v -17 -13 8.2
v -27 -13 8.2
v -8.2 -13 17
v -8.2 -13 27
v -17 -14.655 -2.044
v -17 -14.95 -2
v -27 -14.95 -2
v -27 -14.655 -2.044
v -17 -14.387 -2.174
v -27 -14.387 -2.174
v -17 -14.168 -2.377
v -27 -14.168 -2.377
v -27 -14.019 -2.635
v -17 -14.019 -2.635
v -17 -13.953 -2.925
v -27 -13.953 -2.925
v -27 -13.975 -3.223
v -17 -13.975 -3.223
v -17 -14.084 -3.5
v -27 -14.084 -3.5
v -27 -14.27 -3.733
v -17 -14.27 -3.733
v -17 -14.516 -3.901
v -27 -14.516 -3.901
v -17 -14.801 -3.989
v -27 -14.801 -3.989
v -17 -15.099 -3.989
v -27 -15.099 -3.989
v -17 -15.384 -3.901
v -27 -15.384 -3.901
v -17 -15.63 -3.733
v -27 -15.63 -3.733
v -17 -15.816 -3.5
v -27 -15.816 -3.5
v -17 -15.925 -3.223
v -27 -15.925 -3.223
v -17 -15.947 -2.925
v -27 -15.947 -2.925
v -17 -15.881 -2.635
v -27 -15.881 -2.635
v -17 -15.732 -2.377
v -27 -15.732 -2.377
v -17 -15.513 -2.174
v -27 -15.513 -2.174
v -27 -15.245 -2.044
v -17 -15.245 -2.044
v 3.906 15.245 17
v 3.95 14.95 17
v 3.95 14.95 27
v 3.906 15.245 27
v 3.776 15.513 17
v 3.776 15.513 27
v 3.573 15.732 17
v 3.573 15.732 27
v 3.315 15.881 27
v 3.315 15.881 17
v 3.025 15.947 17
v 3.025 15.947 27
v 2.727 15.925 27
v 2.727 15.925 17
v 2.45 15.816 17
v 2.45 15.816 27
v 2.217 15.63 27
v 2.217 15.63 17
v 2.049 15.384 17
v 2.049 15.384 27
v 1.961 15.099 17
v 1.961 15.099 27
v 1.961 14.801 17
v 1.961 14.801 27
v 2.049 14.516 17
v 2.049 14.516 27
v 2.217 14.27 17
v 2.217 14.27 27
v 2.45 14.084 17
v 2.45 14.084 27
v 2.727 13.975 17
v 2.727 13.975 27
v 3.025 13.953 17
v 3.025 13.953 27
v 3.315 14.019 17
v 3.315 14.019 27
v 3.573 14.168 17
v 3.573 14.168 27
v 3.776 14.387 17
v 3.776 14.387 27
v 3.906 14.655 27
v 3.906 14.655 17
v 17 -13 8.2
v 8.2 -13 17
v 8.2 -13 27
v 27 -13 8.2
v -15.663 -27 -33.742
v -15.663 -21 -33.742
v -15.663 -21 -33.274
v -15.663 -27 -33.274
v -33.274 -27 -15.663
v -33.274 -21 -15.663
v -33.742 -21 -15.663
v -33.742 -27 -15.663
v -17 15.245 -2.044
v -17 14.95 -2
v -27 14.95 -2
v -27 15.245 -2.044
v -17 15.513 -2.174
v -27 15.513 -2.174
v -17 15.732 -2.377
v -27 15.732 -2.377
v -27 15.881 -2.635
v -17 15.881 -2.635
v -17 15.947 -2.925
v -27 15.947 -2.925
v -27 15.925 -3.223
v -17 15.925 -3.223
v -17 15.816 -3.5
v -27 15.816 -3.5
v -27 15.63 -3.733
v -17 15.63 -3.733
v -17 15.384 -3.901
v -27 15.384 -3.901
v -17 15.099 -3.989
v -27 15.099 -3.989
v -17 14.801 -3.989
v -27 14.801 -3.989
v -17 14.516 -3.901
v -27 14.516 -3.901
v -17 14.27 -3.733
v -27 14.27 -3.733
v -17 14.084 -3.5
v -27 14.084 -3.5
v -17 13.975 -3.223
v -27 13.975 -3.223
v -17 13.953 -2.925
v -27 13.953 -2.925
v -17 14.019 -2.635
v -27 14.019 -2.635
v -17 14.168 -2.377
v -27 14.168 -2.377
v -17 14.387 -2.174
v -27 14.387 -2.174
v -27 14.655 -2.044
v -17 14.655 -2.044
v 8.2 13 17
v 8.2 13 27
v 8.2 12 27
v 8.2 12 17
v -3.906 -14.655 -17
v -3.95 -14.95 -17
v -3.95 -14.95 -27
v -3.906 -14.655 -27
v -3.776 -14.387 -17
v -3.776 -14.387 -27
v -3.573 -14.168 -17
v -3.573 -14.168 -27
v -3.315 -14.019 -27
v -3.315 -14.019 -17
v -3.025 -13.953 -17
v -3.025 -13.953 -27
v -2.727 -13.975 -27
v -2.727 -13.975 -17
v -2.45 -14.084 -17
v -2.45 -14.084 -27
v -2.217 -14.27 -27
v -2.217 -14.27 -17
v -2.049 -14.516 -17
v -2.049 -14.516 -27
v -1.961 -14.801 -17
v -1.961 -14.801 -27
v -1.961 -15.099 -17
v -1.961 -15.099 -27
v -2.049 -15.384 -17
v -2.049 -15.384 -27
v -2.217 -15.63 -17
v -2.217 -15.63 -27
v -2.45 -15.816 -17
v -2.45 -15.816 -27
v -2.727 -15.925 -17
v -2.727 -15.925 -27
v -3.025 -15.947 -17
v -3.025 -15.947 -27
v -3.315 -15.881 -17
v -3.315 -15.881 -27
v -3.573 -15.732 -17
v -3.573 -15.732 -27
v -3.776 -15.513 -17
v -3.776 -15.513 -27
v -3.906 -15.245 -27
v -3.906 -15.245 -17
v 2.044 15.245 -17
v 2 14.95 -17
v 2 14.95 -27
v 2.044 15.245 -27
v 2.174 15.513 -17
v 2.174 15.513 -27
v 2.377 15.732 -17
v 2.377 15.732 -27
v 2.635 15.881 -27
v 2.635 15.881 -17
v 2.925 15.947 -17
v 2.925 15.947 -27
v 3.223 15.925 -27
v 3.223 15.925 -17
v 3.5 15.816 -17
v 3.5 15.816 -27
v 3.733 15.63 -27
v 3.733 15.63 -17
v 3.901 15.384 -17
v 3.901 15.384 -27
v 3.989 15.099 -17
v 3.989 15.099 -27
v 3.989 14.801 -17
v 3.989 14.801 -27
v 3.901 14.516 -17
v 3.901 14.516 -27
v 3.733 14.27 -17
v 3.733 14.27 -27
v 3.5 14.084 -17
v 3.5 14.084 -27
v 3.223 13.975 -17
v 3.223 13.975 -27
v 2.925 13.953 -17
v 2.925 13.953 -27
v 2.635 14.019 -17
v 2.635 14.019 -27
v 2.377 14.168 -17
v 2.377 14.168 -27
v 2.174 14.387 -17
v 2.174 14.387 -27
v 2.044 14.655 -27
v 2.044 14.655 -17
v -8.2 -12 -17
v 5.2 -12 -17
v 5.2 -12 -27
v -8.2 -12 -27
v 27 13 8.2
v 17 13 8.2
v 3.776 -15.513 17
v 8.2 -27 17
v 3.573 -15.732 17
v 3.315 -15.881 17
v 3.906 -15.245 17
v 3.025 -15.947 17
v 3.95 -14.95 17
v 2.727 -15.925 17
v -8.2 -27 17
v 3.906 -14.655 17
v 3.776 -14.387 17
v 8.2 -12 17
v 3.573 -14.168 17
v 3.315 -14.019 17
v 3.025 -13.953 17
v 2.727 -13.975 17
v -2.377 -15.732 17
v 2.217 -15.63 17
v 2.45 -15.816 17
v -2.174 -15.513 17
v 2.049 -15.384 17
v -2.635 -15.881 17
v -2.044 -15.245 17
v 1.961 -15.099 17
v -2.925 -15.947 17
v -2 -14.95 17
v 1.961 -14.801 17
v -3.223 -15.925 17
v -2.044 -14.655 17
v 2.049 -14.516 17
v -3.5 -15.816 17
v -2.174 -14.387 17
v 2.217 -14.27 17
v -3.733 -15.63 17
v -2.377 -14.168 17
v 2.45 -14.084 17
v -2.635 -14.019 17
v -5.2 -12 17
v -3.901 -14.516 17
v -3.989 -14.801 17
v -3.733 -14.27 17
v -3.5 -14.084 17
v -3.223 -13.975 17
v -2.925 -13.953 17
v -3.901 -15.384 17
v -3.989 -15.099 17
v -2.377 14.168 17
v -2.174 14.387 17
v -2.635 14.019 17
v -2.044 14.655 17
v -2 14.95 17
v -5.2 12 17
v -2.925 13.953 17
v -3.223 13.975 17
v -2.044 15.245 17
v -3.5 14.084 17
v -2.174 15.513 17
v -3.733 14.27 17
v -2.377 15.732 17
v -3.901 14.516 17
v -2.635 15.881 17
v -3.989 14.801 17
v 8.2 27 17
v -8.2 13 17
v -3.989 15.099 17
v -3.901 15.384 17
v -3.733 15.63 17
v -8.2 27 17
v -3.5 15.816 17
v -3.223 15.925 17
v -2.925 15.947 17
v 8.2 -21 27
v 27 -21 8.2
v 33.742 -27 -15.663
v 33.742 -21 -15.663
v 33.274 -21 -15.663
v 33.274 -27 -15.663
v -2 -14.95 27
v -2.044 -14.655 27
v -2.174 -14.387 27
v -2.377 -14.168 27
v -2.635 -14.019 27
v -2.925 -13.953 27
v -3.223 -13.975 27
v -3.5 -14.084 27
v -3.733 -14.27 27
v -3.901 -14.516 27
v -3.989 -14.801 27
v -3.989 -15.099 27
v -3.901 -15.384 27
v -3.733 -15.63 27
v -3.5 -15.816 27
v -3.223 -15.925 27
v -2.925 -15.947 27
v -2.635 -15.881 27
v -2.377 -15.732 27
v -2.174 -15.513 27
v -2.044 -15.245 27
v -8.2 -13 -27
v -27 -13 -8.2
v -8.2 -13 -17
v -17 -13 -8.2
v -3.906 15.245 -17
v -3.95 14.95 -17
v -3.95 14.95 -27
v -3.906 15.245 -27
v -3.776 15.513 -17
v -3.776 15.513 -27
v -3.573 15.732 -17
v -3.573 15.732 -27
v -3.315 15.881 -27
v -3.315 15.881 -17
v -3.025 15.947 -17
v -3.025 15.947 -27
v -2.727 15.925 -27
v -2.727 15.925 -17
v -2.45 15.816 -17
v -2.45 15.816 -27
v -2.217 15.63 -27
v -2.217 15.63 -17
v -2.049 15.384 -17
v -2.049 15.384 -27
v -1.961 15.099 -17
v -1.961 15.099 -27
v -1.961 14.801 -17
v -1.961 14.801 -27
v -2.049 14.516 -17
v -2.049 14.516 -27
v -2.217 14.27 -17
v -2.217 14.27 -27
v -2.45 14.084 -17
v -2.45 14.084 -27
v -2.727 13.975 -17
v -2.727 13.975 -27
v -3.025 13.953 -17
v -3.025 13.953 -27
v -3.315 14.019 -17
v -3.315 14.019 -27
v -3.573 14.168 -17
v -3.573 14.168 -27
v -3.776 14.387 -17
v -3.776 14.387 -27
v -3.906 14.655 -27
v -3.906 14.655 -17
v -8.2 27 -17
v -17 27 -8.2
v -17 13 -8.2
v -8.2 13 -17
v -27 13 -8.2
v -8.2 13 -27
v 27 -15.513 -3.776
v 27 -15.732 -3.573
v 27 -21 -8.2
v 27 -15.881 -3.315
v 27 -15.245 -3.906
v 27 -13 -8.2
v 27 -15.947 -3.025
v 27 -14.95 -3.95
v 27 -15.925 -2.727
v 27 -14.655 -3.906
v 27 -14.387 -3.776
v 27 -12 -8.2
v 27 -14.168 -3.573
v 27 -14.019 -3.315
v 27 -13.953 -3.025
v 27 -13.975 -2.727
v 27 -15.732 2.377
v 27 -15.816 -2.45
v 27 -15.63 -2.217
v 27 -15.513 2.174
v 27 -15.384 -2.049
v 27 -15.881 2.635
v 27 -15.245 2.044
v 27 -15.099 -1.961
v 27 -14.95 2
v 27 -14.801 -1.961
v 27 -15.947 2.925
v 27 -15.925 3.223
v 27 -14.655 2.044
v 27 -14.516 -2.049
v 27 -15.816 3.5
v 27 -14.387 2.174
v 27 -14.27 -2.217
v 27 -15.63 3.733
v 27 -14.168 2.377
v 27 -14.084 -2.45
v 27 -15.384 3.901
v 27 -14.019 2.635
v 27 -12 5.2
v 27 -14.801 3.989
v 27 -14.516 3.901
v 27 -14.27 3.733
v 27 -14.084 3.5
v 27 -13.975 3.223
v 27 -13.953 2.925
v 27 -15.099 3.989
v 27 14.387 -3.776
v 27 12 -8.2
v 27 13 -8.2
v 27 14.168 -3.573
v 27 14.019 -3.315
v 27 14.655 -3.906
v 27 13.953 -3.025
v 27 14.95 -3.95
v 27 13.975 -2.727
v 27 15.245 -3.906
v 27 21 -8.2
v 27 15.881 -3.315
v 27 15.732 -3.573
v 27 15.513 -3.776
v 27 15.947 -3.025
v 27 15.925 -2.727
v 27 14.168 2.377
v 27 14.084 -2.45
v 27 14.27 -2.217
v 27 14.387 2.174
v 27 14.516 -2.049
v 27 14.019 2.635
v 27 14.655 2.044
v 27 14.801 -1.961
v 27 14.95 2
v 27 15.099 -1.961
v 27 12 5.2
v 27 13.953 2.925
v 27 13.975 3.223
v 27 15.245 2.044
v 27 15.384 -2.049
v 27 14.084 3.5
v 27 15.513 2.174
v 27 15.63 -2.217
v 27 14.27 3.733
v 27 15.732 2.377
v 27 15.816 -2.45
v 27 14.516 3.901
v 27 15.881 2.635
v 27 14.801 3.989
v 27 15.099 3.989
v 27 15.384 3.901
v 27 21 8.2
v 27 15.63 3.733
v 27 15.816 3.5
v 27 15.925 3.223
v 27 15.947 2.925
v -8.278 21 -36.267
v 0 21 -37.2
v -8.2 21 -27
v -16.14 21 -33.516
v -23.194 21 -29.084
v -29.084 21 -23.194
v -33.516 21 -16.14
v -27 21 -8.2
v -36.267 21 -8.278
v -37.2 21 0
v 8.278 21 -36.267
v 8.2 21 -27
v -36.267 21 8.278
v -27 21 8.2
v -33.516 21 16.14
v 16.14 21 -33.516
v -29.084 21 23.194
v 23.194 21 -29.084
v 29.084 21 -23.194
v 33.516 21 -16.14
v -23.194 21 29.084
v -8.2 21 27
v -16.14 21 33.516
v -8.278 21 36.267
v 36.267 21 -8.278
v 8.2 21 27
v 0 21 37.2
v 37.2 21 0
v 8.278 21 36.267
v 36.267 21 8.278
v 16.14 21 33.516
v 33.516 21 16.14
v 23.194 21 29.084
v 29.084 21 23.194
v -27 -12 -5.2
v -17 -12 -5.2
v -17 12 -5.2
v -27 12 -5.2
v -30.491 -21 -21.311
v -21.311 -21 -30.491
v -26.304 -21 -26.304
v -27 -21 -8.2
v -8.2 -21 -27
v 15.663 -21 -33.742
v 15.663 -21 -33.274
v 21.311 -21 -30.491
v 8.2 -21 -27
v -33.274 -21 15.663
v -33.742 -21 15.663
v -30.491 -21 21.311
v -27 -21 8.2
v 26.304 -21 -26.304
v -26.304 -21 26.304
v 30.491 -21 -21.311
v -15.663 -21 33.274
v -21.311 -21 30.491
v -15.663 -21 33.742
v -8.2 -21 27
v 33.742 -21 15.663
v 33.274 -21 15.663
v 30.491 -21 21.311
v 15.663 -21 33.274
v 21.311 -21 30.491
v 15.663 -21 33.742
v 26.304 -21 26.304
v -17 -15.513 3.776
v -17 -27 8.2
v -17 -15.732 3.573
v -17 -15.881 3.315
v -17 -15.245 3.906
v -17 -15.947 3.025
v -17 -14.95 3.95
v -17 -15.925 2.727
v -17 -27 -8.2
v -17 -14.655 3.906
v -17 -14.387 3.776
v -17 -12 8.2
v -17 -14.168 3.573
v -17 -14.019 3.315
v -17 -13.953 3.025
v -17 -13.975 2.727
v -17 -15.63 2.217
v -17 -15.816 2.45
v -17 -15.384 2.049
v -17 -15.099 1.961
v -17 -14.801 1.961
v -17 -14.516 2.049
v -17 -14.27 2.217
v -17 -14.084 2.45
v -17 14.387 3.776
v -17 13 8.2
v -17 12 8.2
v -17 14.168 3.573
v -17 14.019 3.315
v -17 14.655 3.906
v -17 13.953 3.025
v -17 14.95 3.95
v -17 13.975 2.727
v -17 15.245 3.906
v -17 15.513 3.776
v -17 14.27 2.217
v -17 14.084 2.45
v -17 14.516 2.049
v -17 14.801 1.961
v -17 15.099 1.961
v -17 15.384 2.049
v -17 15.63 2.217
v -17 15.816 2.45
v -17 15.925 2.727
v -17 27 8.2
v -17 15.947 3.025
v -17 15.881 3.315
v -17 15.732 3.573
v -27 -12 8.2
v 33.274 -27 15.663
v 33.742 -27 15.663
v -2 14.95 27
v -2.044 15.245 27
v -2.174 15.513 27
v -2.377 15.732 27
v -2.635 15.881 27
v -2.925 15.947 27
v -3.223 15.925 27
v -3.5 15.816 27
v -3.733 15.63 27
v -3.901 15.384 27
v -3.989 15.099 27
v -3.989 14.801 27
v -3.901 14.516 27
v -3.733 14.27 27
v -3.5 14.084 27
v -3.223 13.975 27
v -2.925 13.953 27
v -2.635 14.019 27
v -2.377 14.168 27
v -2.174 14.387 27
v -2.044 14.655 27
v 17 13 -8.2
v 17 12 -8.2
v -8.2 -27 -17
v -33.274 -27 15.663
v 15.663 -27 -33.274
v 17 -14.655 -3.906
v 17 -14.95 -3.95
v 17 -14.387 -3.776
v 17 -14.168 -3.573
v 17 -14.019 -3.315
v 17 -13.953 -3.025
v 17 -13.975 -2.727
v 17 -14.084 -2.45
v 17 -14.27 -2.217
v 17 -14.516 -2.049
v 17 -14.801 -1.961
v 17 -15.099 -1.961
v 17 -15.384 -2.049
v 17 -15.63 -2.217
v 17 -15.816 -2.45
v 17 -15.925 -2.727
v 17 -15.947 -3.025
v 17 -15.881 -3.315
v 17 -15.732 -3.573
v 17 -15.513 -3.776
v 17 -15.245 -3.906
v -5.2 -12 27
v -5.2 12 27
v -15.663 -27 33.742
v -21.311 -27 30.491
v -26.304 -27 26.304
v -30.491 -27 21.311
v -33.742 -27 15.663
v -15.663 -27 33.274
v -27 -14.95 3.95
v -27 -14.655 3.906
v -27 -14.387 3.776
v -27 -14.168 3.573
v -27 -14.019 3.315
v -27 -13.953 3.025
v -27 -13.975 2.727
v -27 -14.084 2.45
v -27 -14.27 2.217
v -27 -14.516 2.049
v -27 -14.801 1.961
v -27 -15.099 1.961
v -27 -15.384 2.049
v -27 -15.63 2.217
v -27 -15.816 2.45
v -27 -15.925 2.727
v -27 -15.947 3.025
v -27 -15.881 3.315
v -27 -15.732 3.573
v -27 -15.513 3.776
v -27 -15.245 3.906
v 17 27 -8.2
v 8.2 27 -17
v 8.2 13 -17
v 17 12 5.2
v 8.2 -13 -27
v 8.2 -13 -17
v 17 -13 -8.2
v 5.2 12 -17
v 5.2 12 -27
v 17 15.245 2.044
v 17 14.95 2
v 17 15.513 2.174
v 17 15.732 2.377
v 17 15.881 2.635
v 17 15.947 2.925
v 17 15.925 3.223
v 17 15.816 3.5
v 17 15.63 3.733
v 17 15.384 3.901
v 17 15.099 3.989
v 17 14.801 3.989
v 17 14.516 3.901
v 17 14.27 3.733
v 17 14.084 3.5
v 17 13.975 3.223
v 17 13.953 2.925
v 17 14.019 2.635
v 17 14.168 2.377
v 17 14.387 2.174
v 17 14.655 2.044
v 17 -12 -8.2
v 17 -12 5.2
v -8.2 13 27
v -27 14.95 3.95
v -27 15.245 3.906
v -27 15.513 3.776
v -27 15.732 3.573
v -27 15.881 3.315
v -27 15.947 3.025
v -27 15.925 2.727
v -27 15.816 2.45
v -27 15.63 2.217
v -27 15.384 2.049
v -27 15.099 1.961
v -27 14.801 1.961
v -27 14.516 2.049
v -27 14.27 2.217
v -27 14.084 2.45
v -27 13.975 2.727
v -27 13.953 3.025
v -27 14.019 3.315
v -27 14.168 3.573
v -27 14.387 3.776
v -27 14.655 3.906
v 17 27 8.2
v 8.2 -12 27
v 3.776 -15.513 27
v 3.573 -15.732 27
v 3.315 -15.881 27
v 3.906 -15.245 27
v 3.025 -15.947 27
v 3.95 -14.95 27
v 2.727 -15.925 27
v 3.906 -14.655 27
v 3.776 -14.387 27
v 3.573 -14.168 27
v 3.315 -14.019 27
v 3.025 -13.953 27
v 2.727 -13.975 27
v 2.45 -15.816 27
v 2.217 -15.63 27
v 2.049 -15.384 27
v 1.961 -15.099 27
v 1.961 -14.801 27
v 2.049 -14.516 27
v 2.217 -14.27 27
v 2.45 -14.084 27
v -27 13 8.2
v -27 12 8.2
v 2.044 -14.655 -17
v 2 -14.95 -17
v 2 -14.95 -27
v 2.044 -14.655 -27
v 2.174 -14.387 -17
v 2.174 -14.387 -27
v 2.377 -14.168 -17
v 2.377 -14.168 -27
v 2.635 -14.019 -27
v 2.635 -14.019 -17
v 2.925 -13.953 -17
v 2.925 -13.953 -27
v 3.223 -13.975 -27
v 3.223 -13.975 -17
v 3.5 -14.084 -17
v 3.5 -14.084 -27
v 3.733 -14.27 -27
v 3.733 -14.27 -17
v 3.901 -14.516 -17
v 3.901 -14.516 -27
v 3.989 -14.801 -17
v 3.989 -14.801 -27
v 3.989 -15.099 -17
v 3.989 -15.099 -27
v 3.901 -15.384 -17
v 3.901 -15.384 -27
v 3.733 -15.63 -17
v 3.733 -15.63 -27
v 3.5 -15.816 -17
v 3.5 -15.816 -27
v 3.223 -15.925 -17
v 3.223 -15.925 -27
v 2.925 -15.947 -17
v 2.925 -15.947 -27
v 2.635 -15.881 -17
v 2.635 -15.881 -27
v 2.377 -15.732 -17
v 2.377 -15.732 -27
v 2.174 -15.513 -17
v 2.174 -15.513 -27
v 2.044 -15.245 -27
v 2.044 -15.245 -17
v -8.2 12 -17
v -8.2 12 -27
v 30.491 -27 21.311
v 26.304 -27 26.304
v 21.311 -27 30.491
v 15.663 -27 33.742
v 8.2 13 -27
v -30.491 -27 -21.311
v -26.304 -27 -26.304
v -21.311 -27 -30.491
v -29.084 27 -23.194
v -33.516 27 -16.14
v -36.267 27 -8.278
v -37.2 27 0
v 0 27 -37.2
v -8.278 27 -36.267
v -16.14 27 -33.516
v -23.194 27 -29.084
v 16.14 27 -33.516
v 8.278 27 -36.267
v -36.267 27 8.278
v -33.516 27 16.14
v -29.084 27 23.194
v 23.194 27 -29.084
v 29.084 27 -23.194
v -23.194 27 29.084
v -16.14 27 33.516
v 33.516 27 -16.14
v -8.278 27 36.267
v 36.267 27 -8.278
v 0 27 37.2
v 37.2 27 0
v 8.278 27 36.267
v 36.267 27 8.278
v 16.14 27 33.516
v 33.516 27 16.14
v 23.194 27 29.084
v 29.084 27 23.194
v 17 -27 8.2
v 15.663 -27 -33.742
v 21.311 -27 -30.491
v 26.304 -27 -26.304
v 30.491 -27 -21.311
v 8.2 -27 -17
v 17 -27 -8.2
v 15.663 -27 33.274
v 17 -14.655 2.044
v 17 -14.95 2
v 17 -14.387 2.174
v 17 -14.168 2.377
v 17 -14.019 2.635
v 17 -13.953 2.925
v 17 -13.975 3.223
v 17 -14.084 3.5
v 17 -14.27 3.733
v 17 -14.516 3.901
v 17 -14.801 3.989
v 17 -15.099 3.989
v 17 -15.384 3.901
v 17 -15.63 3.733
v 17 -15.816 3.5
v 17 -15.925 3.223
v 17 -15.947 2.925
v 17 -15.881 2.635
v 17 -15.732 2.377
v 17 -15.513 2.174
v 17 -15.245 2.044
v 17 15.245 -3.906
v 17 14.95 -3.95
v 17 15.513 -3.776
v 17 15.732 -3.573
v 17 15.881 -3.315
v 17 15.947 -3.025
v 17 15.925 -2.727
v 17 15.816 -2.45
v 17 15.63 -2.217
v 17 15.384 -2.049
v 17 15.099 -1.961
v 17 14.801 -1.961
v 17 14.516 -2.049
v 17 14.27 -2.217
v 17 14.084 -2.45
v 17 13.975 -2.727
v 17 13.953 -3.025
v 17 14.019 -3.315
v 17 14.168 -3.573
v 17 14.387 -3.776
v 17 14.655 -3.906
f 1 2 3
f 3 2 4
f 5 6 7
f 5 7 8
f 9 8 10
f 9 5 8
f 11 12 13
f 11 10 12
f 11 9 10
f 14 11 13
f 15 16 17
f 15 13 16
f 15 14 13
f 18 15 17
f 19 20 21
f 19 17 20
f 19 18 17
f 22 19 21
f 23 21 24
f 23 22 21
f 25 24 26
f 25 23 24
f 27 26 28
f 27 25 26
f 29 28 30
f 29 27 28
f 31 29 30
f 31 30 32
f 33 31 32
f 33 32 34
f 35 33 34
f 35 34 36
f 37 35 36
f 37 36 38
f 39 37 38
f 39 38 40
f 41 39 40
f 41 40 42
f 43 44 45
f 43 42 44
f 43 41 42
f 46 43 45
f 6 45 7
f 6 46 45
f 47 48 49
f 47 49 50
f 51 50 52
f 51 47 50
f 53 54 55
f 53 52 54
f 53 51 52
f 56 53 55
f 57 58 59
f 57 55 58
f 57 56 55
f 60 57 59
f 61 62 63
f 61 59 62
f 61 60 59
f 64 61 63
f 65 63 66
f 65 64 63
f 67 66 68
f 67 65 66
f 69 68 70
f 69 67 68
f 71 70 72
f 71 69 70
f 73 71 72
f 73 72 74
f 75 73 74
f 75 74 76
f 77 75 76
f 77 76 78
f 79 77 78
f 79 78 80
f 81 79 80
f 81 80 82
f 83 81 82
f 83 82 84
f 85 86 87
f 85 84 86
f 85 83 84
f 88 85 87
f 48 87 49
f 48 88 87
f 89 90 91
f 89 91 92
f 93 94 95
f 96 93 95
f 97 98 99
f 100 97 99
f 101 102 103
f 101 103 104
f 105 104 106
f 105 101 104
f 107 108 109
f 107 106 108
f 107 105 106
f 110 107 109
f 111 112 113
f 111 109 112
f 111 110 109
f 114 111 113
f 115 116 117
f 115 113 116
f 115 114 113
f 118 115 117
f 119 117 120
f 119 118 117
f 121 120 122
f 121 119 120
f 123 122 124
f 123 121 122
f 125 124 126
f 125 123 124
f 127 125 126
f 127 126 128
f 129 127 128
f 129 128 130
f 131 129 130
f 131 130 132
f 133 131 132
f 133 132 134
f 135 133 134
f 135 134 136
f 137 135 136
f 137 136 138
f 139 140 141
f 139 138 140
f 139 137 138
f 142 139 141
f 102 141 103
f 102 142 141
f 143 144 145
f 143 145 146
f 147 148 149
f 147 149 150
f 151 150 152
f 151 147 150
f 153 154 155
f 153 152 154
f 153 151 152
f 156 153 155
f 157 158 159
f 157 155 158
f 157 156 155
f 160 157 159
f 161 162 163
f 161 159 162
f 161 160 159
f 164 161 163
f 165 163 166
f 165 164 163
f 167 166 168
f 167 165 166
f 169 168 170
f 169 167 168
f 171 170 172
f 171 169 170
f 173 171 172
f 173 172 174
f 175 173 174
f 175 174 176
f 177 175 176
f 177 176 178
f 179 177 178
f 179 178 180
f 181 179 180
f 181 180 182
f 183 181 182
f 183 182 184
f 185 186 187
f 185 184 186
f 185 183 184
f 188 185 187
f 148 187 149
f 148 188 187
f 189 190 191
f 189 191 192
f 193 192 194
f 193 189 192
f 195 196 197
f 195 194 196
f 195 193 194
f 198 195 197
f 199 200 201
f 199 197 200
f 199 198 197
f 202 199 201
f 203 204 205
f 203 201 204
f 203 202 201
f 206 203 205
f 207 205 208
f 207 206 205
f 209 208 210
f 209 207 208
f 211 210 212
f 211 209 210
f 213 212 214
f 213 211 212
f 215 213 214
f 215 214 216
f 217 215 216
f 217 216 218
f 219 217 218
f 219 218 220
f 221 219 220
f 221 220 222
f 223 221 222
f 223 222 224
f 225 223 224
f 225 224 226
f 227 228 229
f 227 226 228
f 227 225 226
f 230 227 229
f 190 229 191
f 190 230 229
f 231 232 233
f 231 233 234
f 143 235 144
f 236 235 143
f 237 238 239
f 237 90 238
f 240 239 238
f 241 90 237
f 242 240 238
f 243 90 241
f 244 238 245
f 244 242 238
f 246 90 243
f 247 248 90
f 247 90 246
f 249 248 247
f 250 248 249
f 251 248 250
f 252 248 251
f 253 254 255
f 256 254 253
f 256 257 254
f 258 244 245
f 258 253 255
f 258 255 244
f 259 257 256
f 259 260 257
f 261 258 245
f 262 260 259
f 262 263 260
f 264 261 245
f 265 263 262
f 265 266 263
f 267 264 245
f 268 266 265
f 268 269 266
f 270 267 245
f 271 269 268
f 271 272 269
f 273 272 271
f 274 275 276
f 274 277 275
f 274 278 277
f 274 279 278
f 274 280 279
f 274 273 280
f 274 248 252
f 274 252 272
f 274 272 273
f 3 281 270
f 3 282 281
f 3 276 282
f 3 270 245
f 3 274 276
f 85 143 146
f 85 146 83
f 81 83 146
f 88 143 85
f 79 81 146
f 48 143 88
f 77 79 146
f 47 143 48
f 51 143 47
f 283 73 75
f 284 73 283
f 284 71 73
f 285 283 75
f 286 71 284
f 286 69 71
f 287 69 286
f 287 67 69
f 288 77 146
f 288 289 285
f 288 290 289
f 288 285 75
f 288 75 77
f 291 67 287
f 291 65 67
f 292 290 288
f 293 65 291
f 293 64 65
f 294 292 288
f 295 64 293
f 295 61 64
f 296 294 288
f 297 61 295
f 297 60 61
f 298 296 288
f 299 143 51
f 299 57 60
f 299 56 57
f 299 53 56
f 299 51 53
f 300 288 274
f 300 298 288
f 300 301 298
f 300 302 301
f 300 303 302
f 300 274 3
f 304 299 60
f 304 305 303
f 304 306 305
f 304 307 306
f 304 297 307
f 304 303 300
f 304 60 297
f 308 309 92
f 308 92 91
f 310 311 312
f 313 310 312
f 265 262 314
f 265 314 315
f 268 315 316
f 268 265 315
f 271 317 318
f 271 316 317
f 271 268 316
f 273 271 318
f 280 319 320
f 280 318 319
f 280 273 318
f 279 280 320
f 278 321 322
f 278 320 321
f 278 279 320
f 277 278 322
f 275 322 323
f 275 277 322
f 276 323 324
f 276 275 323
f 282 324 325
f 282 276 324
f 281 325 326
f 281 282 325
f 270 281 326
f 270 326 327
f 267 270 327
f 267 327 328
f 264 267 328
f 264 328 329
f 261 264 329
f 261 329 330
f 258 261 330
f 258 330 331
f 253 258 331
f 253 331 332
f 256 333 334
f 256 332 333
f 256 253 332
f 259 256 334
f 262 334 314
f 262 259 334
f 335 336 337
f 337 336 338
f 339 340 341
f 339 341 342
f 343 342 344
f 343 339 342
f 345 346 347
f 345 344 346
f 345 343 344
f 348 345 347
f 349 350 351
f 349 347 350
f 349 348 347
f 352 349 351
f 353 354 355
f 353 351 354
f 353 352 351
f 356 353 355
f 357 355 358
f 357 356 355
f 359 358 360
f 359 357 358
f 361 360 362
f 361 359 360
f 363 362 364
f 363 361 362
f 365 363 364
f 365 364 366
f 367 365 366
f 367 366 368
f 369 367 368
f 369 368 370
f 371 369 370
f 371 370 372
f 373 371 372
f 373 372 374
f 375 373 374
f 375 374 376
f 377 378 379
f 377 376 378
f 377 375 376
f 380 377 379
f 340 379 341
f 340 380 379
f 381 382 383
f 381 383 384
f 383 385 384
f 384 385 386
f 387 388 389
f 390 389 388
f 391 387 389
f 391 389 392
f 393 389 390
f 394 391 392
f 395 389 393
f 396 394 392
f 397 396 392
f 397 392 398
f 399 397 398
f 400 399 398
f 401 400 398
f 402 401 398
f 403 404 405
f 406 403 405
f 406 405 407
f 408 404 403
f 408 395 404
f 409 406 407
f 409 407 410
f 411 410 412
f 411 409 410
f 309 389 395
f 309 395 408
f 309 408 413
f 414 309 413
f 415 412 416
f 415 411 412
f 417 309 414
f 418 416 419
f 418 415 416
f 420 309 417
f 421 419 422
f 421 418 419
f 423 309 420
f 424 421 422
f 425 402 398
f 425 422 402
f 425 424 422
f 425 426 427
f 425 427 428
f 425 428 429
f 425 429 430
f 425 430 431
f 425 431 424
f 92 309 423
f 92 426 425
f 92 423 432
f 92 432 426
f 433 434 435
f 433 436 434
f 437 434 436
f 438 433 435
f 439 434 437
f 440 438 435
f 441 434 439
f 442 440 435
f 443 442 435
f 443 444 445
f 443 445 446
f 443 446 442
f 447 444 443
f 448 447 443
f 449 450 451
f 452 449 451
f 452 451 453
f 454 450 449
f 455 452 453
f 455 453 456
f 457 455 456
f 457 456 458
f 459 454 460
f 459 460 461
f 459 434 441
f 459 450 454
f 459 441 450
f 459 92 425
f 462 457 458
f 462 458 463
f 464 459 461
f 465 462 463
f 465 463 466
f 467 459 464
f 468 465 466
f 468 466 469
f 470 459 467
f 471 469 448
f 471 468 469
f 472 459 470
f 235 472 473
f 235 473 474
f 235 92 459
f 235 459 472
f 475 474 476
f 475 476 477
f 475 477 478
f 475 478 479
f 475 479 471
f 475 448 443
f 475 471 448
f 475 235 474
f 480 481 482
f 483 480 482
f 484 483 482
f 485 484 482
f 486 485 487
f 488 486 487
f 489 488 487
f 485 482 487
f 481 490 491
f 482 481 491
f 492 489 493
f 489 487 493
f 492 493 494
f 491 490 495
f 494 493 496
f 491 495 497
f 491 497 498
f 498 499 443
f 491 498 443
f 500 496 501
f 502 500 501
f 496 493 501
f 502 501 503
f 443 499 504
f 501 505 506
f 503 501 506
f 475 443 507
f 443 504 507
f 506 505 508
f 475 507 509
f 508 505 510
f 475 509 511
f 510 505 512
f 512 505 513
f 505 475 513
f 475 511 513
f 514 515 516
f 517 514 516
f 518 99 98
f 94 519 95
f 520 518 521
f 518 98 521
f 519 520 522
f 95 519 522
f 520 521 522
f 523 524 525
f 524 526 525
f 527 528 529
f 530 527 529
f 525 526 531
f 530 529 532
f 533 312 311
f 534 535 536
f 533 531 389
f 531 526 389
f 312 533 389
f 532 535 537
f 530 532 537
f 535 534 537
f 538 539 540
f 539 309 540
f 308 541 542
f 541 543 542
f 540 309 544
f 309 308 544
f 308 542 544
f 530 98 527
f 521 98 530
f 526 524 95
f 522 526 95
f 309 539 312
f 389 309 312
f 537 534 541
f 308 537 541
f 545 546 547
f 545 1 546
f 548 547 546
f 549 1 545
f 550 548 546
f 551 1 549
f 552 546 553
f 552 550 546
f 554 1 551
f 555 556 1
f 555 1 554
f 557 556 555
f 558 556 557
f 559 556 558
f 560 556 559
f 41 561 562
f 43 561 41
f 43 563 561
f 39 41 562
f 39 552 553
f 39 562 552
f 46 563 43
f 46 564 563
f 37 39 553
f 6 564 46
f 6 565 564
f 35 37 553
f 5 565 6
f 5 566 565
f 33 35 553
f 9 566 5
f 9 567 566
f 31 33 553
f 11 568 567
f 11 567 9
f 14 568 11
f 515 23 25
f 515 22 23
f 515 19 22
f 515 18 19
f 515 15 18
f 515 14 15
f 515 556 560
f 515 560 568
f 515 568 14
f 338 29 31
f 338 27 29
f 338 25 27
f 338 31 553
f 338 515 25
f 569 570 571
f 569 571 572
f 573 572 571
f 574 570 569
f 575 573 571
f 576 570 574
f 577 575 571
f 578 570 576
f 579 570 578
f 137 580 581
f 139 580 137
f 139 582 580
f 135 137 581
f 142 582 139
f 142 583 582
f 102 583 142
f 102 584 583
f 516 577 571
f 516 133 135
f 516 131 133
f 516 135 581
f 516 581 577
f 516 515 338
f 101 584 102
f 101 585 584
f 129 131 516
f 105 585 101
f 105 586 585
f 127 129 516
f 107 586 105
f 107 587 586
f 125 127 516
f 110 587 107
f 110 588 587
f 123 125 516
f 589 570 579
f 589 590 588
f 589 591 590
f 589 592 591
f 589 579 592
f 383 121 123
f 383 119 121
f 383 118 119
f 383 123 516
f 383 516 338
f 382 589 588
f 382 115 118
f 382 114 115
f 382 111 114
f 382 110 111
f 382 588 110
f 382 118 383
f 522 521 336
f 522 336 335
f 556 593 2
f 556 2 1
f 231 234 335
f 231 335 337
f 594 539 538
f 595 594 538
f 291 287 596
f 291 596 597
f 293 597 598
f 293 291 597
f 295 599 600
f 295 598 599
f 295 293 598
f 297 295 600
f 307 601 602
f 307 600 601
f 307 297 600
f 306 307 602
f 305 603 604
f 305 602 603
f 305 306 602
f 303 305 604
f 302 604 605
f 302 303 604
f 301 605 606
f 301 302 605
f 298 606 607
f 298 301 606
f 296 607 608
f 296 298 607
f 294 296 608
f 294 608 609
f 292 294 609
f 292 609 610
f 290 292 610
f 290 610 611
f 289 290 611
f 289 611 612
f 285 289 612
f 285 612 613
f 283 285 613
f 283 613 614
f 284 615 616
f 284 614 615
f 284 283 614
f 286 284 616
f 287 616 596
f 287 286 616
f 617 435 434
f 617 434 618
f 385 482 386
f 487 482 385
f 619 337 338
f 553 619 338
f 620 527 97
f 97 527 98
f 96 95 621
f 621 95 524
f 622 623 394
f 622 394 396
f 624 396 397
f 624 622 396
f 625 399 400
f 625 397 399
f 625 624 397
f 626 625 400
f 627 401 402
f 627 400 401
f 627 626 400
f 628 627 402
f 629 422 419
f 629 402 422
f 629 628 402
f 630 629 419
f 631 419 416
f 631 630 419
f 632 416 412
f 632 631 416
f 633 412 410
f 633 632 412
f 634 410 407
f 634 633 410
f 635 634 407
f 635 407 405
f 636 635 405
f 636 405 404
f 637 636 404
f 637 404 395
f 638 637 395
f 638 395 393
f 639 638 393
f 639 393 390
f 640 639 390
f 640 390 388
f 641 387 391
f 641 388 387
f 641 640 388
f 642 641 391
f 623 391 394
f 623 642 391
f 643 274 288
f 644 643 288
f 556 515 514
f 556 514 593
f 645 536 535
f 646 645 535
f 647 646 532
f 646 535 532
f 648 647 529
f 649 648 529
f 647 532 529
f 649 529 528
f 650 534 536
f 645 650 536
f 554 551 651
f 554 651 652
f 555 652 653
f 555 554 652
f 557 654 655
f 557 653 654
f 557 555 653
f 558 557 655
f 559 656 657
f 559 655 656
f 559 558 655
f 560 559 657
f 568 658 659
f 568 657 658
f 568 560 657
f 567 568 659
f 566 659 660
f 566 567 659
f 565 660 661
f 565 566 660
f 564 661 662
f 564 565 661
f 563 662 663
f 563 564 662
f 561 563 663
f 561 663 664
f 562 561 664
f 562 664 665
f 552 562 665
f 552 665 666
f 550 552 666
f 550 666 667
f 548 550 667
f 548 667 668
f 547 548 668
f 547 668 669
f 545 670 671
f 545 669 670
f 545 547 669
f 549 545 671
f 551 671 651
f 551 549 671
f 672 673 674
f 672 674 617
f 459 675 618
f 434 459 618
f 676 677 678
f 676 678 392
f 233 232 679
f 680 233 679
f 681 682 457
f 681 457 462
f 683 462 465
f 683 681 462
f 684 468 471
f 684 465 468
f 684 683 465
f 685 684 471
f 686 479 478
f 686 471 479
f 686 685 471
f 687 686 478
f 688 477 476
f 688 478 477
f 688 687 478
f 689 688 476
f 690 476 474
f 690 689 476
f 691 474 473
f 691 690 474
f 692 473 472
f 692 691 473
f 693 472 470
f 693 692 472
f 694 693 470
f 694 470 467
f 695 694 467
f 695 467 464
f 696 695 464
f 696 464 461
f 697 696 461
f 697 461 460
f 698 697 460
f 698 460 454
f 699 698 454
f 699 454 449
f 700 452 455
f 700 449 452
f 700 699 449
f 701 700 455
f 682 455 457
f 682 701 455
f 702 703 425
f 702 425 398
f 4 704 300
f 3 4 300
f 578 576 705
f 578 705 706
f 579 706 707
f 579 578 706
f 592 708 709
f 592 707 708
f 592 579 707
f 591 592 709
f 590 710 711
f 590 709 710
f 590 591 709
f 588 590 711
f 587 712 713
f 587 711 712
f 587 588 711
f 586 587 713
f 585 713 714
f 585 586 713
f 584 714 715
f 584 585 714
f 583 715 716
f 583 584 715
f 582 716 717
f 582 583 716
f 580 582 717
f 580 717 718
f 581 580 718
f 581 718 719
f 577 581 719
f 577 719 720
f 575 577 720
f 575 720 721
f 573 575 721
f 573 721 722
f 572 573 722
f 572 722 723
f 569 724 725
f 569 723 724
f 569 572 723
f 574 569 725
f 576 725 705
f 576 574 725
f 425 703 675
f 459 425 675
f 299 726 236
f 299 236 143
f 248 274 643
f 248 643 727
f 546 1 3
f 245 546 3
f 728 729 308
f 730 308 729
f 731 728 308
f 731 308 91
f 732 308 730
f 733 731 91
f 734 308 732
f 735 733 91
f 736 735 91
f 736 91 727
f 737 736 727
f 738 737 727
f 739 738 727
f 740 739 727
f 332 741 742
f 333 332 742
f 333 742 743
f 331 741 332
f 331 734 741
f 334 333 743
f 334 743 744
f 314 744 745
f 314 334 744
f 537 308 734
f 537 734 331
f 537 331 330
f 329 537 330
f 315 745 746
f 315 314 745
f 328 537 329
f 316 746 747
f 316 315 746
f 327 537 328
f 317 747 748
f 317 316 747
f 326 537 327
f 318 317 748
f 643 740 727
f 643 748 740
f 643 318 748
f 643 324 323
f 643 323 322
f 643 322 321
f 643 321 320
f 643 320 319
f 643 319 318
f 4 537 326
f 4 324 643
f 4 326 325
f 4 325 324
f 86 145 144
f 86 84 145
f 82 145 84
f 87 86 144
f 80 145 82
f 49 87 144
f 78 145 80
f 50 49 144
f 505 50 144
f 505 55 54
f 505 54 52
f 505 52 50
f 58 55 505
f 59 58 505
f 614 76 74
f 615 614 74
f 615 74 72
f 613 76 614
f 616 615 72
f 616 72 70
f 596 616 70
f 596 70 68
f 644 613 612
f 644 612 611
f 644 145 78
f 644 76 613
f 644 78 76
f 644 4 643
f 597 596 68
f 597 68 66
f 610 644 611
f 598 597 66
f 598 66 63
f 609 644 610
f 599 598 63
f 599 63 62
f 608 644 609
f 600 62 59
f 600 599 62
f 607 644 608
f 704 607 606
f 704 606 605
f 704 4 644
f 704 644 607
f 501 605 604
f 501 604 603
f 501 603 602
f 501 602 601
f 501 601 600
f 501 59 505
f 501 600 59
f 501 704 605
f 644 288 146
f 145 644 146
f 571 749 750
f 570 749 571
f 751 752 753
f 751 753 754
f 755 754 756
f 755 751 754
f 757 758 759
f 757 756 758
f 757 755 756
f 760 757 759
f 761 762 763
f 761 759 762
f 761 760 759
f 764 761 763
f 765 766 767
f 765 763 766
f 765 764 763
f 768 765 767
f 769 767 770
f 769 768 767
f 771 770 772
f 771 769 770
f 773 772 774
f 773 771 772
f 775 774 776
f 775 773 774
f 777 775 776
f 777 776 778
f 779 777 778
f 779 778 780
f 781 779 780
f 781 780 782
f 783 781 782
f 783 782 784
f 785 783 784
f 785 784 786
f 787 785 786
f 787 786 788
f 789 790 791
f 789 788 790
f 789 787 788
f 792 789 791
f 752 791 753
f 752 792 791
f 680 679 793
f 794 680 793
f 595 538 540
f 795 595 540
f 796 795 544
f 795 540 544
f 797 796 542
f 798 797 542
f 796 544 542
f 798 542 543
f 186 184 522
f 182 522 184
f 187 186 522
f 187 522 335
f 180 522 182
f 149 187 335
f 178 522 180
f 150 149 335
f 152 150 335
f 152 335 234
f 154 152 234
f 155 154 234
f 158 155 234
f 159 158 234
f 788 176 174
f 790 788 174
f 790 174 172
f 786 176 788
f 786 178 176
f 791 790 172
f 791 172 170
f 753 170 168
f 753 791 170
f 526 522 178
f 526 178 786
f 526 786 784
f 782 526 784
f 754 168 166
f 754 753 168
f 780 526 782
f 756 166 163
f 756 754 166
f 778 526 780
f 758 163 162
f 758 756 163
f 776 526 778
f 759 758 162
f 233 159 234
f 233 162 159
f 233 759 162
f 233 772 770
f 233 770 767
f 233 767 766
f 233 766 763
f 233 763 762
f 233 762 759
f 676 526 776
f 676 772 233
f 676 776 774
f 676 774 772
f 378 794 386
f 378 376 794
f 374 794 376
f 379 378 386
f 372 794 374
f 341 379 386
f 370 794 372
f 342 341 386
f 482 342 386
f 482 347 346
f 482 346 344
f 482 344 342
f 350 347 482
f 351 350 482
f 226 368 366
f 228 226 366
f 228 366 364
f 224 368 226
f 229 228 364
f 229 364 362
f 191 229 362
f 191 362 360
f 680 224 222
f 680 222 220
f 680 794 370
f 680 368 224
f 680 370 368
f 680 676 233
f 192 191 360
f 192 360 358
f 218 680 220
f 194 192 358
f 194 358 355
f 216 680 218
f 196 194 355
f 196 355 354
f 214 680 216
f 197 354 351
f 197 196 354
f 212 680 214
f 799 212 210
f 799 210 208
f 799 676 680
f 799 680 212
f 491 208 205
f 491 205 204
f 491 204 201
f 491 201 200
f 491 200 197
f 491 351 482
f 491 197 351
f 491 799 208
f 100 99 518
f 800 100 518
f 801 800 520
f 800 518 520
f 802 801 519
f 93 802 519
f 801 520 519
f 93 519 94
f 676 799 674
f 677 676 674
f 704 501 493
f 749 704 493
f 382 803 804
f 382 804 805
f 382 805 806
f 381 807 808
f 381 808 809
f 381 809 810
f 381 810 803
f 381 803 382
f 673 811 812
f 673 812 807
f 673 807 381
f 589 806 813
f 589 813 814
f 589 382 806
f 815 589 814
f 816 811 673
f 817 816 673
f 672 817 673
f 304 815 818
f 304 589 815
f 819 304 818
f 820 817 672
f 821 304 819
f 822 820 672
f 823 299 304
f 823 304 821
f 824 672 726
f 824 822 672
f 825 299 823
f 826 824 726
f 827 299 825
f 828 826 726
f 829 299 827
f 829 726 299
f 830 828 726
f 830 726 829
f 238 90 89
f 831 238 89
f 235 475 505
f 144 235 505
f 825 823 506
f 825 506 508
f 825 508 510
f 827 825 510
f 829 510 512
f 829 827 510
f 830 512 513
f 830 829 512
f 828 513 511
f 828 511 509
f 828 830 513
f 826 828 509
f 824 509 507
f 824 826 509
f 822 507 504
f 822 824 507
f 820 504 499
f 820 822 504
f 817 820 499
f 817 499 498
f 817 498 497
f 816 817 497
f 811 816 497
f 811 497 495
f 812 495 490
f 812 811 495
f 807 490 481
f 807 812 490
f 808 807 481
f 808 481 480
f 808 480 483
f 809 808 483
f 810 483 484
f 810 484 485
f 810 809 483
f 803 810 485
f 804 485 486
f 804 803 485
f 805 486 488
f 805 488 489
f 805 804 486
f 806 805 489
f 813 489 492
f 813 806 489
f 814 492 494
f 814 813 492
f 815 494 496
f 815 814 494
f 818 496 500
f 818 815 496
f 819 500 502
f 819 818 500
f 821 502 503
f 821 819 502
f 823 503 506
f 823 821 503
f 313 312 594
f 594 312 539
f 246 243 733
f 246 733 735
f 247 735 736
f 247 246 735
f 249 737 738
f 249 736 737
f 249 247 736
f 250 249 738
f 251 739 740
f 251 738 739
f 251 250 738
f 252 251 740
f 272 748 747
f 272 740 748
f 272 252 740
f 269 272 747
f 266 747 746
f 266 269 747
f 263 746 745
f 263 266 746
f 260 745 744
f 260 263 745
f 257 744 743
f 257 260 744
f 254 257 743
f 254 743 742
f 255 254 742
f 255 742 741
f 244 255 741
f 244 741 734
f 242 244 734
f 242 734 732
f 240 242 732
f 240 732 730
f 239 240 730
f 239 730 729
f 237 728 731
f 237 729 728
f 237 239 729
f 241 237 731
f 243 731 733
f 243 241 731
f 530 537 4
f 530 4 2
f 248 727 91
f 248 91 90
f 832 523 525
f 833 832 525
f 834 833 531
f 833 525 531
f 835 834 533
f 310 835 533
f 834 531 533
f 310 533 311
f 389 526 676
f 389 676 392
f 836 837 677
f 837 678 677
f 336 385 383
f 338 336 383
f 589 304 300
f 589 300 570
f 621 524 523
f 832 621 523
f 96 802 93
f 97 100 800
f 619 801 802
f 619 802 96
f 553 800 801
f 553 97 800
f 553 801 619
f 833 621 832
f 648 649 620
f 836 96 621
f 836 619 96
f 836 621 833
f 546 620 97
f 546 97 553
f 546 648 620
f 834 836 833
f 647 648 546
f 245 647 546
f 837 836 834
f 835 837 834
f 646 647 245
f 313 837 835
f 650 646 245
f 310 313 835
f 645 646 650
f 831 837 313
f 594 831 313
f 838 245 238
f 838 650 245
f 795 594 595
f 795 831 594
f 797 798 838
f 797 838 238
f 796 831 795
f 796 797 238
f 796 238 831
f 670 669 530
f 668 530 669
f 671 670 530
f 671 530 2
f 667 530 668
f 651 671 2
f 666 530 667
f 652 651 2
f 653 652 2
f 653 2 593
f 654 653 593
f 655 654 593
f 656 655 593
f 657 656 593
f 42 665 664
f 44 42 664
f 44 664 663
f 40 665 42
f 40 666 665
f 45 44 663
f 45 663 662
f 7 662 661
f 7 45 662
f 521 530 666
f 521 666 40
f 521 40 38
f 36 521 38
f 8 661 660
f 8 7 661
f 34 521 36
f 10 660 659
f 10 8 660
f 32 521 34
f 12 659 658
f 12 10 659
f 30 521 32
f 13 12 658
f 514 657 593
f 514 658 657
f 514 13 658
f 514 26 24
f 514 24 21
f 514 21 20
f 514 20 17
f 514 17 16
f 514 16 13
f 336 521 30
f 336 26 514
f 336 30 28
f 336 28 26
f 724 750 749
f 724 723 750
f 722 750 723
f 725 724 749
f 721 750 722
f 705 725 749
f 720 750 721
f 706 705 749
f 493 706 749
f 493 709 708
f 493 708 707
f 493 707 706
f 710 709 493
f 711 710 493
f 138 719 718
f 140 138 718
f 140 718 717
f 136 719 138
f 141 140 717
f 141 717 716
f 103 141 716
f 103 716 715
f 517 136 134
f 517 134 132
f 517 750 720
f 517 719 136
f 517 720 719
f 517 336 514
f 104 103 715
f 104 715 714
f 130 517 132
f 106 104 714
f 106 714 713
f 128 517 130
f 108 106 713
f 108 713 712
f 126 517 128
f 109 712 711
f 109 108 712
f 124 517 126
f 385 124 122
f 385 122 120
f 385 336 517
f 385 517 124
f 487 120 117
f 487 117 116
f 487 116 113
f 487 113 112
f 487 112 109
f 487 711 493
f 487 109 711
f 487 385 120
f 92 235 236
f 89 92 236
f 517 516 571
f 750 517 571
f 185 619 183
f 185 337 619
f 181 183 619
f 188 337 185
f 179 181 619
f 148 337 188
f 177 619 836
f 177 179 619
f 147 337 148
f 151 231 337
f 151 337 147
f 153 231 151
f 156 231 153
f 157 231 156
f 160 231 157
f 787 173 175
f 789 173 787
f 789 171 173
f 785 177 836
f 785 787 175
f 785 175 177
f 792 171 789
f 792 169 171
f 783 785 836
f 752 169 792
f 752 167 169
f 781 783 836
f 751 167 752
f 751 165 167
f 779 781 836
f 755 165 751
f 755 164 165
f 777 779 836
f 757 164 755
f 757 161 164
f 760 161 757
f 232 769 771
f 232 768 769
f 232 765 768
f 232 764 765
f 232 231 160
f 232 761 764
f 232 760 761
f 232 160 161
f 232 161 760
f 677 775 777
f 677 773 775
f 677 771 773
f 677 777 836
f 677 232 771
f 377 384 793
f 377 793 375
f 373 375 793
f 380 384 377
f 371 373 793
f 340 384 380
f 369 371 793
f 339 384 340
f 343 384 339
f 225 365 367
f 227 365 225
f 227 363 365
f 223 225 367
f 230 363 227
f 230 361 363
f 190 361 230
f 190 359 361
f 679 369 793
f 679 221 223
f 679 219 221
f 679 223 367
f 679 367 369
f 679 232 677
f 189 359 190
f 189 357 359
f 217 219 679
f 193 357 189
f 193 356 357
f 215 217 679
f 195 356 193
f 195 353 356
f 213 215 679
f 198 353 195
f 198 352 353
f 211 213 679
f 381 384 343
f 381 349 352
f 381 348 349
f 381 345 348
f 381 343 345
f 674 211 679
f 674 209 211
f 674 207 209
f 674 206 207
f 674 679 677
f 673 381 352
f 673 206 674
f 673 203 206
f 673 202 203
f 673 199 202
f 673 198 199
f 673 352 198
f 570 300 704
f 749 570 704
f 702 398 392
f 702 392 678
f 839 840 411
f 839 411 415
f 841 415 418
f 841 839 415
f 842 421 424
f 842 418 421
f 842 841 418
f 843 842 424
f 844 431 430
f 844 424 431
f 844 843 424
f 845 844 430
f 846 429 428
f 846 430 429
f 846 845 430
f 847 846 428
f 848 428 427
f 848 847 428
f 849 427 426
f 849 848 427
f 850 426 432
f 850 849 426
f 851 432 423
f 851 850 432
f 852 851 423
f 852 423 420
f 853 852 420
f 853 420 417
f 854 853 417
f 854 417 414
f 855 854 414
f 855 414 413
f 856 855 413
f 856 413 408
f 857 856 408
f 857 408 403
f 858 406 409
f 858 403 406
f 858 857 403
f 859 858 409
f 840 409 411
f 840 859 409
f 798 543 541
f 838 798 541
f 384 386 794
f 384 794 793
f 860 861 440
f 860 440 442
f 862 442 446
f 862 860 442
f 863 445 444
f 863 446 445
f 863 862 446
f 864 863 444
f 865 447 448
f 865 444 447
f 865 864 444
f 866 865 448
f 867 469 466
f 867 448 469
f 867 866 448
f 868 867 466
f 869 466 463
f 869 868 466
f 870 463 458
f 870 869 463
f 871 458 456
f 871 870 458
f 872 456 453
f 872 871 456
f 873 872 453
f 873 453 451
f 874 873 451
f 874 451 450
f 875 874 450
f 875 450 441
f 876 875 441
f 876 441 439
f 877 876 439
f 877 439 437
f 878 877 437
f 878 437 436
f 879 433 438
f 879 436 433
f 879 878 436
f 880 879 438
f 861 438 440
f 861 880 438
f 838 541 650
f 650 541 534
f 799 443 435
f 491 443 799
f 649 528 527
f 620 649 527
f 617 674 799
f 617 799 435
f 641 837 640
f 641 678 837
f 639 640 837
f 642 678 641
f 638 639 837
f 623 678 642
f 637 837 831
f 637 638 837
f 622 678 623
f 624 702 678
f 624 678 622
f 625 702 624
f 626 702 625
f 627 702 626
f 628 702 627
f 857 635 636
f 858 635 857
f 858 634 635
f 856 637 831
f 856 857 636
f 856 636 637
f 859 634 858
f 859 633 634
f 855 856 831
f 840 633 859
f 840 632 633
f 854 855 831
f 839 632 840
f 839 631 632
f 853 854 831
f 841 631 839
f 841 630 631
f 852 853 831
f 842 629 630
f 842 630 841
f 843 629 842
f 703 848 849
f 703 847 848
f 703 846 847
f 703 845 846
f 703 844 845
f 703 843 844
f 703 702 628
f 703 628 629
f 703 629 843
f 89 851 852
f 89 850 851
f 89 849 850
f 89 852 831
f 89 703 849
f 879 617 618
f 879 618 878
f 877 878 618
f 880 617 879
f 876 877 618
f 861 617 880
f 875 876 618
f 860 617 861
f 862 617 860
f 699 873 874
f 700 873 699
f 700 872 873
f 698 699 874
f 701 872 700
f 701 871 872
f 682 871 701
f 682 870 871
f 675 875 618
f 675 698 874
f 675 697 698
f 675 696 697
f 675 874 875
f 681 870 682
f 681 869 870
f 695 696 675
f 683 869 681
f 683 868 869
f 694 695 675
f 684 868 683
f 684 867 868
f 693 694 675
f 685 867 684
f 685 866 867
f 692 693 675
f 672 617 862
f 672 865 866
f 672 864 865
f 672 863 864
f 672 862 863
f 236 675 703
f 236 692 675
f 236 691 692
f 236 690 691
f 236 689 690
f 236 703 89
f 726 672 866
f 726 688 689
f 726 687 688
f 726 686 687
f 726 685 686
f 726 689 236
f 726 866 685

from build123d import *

# Parameters (mm, degrees)
BOSS_EXTRUDE1_DEPTH      = 8.2
BOSS_EXTRUDE1_DEPTH_BACK = 8.2
SKETCH2_W                = 10
SKETCH2_H                = 42
CUT_EXTRUDE1_DEPTH       = 25.662522174
CUT_EXTRUDE1_DEPTH_BACK  = 25.662522174
SKETCH4_R                = 1
SKETCH4_W                = 13.4
SKETCH4_H                = 24
CIRPATTERN1_COUNT        = 4
BOSS_EXTRUDE2_DEPTH      = 8
BOSS_EXTRUDE3_DEPTH      = 8
BOSS_EXTRUDE4_DEPTH      = 6
BOSS_EXTRUDE5_START      = 6
SKETCH23_R               = 37.2
BOSS_EXTRUDE5_DEPTH      = 6


with BuildPart() as part:
    # Sketch2 → Boss-Extrude1 (new, two sides: drawn at the far end of the back side and taken through both)
    with BuildSketch(Plane(origin=(0, 0, 0), x_dir=(0, 0, -1), z_dir=(1, 0, 0)).offset(-BOSS_EXTRUDE1_DEPTH_BACK)):
        with Locations((-22, 0)):
            Rectangle(SKETCH2_W, SKETCH2_H)
    extrude(amount=BOSS_EXTRUDE1_DEPTH + BOSS_EXTRUDE1_DEPTH_BACK)

    # Sketch4 → Cut-Extrude1 (cut, two sides: drawn at the far end of the back side and taken through both)
    with BuildSketch(Plane.XY.offset(27).offset(-CUT_EXTRUDE1_DEPTH_BACK)):
        with Locations((-3, 14.95)):
            Circle(SKETCH4_R)
        with Locations((2.95, 14.95)):
            Circle(SKETCH4_R)
        with Locations((-3, -14.95)):
            Circle(SKETCH4_R)
        with Locations((2.95, -14.95)):
            Circle(SKETCH4_R)
        with Locations((1.5, 0)):
            Rectangle(SKETCH4_W, SKETCH4_H)
    extrude(amount=CUT_EXTRUDE1_DEPTH + CUT_EXTRUDE1_DEPTH_BACK, mode=Mode.SUBTRACT)


with BuildPart() as cirpattern1_1:
    # CirPattern1: pattern copy
    add(part.part.rotate(Axis((0, 12.69022869, 0), (0, -1, 0)), 1 * 360 / CIRPATTERN1_COUNT))


with BuildPart() as cirpattern1_2:
    # CirPattern1: pattern copy
    add(part.part.rotate(Axis((0, 12.69022869, 0), (0, -1, 0)), 2 * 360 / CIRPATTERN1_COUNT))


with BuildPart() as cirpattern1_3:
    # CirPattern1: pattern copy
    add(part.part.rotate(Axis((0, 12.69022869, 0), (0, -1, 0)), 3 * 360 / CIRPATTERN1_COUNT))


with BuildPart() as part_1:
    add(part.part)

    add(cirpattern1_1.part)  # Boss-Extrude2 merges CirPattern1_1

    add(cirpattern1_2.part)  # Boss-Extrude2 merges CirPattern1_2

    add(cirpattern1_3.part)  # Boss-Extrude2 merges CirPattern1_3
    # Sketch20 → Boss-Extrude2 (add)
    with BuildSketch(Plane(origin=(0, 21, 0), x_dir=(1, 0, 0), z_dir=(0, 1, 0))):
        Polygon((-17, 8.2), (-8.2, 17), (-8.2, 27), (-27, 8.2), align=None)
        Polygon((-17, -8.2), (-8.2, -17), (-8.2, -27), (-27, -8.2), align=None)
        Polygon((8.2, -17), (17, -8.2), (27, -8.2), (8.2, -27), align=None)
        Polygon((8.2, 17), (17, 8.2), (27, 8.2), (8.2, 27), align=None)
    extrude(amount=-BOSS_EXTRUDE2_DEPTH)

    # Sketch21 → Boss-Extrude3 (add)
    with BuildSketch(Plane.XZ.offset(21)):
        Polygon((-17, 8.2), (-8.2, 17), (-8.2, 27), (-27, 8.2), align=None)
        Polygon((17, -8.2), (8.2, -17), (8.2, -27), (27, -8.2), align=None)
        Polygon((-8.2, -17), (-17, -8.2), (-27, -8.2), (-8.2, -27), align=None)
        Polygon((8.2, 17), (17, 8.2), (27, 8.2), (8.2, 27), align=None)
    extrude(amount=-BOSS_EXTRUDE3_DEPTH)

    # Sketch22 → Boss-Extrude4 (add)
    with BuildSketch(Plane.XZ.offset(21)):
        with BuildLine():
            ThreePointArc((-15.663157895, 33.741746913), (-26.30437226, 26.30437226), (-33.741746913, 15.663157895))
            Line((-33.741746913, 15.663157895), (-33.274371034, 15.663157895))
            Line((-33.274371034, 15.663157895), (-33.274371034, -15.663157895))
            Line((-33.274371034, -15.663157895), (-33.741746913, -15.663157895))
            ThreePointArc((-33.741746913, -15.663157895), (-26.30437226, -26.30437226), (-15.663157895, -33.741746913))
            Line((-15.663157895, -33.741746913), (-15.663157895, -33.274371034))
            Line((-15.663157895, -33.274371034), (15.663157895, -33.274371034))
            Line((15.663157895, -33.274371034), (15.663157895, -33.741746913))
            ThreePointArc((15.663157895, -33.741746913), (26.30437226, -26.30437226), (33.741746913, -15.663157895))
            Line((33.741746913, -15.663157895), (33.274371034, -15.663157895))
            Line((33.274371034, -15.663157895), (33.274371034, 15.663157895))
            Line((33.274371034, 15.663157895), (33.741746913, 15.663157895))
            ThreePointArc((33.741746913, 15.663157895), (26.30437226, 26.30437226), (15.663157895, 33.741746913))
            Line((15.663157895, 33.741746913), (15.663157895, 33.274371034))
            Line((15.663157895, 33.274371034), (-15.663157895, 33.274371034))
            Line((-15.663157895, 33.274371034), (-15.663157895, 33.741746913))
        make_face()
        Polygon((-17, -8.2), (-17, 8.2), (-8.2, 17), (8.2, 17), (17, 8.2), (17, -8.2), (8.2, -17), (-8.2, -17), align=None, mode=Mode.SUBTRACT)
    extrude(amount=BOSS_EXTRUDE4_DEPTH)

    # Sketch23 → Boss-Extrude5 (add)
    with BuildSketch(Plane(origin=(0, 21, 0), x_dir=(1, 0, 0), z_dir=(0, 1, 0)).offset(BOSS_EXTRUDE5_START)):
        Circle(SKETCH23_R)
        Polygon((-17, 8.2), (-8.2, 17), (8.2, 17), (17, 8.2), (17, -8.2), (8.2, -17), (-8.2, -17), (-17, -8.2), align=None, mode=Mode.SUBTRACT)
    extrude(amount=-BOSS_EXTRUDE5_DEPTH)


solid = part_1.part
